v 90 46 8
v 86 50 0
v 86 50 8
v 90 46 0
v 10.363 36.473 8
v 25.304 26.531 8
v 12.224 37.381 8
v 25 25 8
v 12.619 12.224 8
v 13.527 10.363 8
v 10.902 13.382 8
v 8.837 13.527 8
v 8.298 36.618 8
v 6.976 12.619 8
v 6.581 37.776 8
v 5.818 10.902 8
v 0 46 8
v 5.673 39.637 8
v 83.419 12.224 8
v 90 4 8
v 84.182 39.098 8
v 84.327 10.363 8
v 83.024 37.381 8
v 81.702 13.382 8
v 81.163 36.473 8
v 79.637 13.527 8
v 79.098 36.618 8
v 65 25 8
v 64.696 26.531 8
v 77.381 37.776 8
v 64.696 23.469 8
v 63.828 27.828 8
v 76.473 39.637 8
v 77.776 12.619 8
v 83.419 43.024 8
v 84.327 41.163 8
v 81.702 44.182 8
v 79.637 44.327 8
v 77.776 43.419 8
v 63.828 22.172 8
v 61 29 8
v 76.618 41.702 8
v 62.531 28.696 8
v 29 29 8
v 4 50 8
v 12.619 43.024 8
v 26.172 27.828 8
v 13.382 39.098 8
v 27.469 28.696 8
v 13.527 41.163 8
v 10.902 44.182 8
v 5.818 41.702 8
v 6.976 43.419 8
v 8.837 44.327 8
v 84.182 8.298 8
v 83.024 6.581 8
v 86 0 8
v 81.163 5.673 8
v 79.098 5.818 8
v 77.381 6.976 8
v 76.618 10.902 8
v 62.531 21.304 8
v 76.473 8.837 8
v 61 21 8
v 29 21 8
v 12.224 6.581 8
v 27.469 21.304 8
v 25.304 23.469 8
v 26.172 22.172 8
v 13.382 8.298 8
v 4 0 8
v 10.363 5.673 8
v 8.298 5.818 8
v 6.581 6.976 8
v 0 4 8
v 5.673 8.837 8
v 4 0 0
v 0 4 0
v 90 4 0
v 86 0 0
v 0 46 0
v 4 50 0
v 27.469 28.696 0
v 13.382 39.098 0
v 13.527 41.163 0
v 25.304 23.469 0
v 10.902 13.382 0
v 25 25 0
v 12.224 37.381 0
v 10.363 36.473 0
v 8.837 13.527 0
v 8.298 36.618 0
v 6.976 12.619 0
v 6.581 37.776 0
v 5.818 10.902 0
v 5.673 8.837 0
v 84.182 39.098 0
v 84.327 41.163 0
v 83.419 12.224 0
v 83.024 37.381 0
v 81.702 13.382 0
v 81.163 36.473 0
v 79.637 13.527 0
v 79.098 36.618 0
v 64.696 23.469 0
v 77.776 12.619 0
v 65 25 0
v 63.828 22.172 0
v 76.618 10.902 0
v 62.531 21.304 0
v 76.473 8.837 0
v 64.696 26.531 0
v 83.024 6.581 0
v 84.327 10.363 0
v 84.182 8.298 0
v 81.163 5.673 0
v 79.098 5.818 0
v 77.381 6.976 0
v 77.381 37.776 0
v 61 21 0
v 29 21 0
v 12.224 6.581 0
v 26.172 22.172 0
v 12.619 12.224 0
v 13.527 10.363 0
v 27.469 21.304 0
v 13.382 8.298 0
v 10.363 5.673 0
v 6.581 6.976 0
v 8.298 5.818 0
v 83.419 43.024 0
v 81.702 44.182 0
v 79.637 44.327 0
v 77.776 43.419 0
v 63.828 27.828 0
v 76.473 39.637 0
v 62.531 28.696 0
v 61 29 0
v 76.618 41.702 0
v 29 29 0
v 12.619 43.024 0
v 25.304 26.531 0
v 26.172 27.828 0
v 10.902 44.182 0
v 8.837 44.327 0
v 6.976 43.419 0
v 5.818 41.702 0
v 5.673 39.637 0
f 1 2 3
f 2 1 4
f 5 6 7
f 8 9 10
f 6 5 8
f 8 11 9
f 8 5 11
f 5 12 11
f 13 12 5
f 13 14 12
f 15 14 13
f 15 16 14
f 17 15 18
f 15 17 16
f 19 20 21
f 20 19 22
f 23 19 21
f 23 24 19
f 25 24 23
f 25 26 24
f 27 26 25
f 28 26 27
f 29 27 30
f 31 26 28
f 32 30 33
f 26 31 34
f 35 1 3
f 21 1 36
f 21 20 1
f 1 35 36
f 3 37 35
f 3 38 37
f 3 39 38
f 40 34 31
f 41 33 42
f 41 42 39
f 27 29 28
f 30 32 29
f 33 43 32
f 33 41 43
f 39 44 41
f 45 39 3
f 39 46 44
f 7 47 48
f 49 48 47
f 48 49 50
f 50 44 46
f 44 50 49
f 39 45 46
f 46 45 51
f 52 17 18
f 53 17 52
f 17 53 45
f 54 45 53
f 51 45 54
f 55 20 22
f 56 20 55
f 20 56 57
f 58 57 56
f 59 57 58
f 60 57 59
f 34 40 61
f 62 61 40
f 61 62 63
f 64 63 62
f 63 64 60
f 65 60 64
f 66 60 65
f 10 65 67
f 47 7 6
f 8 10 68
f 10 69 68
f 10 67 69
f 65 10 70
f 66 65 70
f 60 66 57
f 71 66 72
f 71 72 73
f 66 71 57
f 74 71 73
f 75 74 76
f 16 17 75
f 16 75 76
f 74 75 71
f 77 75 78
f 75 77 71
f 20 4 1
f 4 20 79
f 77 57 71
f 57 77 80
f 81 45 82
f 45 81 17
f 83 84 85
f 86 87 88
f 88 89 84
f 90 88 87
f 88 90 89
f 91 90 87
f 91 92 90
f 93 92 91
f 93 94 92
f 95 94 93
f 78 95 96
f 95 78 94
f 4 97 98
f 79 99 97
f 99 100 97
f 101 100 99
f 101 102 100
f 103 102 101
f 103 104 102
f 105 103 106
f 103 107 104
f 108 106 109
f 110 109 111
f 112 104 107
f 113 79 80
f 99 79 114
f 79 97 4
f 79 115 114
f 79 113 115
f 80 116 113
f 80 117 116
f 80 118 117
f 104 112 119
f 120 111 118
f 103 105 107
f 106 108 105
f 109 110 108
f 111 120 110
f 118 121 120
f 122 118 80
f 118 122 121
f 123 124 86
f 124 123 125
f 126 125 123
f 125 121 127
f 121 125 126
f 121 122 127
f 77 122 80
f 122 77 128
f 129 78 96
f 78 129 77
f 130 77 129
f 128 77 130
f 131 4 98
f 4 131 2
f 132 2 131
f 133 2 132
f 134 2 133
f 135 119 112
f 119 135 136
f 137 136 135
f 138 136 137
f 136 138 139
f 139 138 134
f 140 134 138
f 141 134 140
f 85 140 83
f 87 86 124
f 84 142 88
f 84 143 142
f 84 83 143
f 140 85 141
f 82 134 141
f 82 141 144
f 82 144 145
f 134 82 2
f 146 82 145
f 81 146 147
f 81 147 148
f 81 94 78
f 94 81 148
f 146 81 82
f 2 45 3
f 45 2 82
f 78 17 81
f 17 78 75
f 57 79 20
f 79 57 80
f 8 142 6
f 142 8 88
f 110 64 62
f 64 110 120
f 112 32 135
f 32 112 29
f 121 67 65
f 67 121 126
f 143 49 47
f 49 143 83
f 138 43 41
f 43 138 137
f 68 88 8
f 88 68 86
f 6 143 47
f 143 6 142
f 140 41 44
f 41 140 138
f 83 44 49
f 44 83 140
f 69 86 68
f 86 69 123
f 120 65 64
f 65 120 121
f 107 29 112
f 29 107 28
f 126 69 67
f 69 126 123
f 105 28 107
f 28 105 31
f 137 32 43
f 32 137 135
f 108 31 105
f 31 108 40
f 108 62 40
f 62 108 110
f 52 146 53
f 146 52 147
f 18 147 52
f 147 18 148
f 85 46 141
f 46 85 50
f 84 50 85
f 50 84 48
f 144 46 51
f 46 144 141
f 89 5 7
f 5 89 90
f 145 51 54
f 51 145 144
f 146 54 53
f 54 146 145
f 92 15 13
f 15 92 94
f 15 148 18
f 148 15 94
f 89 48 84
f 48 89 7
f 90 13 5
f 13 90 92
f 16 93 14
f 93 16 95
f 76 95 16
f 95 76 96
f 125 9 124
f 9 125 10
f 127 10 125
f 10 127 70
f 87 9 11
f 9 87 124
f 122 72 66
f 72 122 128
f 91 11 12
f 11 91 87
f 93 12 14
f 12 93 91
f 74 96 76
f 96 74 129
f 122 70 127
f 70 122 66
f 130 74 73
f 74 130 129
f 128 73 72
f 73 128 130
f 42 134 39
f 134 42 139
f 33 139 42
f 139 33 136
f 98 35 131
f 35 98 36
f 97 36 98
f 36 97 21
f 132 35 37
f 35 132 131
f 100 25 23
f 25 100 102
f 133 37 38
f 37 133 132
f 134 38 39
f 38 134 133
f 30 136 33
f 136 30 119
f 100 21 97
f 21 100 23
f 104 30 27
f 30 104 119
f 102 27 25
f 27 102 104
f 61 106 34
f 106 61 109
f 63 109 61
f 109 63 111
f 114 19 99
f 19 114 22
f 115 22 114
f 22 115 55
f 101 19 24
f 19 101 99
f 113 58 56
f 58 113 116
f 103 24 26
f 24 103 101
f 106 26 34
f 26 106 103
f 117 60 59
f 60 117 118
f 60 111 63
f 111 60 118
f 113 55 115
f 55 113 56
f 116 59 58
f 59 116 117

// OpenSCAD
$fn = 32;

// ----------------------------------------------------------------------
// Bracket plate: slot plate 90 x 50
// ----------------------------------------------------------------------

// --- parameters (mm) ---
hole_r = 4;               // bolt hole radius
plate_t = 8;              // plate thickness, Z (extrusion height)
plate_l = 90;             // plate length
plate_w = 50;             // plate width
slot_l = 32;              // slot straight length
slot_r = 4;               // slot end radius

slot_len = slot_l + 2 * slot_r;
slot_w = 2 * slot_r;
hole_d2 = 2 * hole_r;

profile = [[4, 0], [86, 0], [90, 4], [90, 46], [86, 50], [4, 50], [0, 46], [0, 4]];  // primary outline, 8 points, counter clockwise
void_1 = [[61, 21], [62.531, 21.304], [63.828, 22.172], [64.696, 23.469], [65, 25], [64.696, 26.531], [63.828, 27.828], [62.531, 28.696], [61, 29], [29, 29], [27.469, 28.696], [26.172, 27.828], [25.304, 26.531], [25, 25], [25.304, 23.469], [26.172, 22.172], [27.469, 21.304], [29, 21]];  // grip slot, 18 points
void_2 = [[13.527, 41.163], [12.619, 43.024], [10.902, 44.182], [8.837, 44.327], [6.976, 43.419], [5.818, 41.702], [5.673, 39.637], [6.581, 37.776], [8.298, 36.618], [10.363, 36.473], [12.224, 37.381], [13.382, 39.098]];  // corner hole, 12 points
void_3 = [[13.527, 10.363], [12.619, 12.224], [10.902, 13.382], [8.837, 13.527], [6.976, 12.619], [5.818, 10.902], [5.673, 8.837], [6.581, 6.976], [8.298, 5.818], [10.363, 5.673], [12.224, 6.581], [13.382, 8.298]];  // corner hole, 12 points
void_4 = [[84.327, 41.163], [83.419, 43.024], [81.702, 44.182], [79.637, 44.327], [77.776, 43.419], [76.618, 41.702], [76.473, 39.637], [77.381, 37.776], [79.098, 36.618], [81.163, 36.473], [83.024, 37.381], [84.182, 39.098]];  // corner hole, 12 points
void_5 = [[84.327, 10.363], [83.419, 12.224], [81.702, 13.382], [79.637, 13.527], [77.776, 12.619], [76.618, 10.902], [76.473, 8.837], [77.381, 6.976], [79.098, 5.818], [81.163, 5.673], [83.024, 6.581], [84.182, 8.298]];  // corner hole, 12 points

// --- the one profile operation ---
difference() {
  linear_extrude(height = plate_t) polygon(points = profile);
  translate([0, 0, -1])
    linear_extrude(height = plate_t + 2) polygon(points = void_1);
  translate([0, 0, -1])
    linear_extrude(height = plate_t + 2) polygon(points = void_2);
  translate([0, 0, -1])
    linear_extrude(height = plate_t + 2) polygon(points = void_3);
  translate([0, 0, -1])
    linear_extrude(height = plate_t + 2) polygon(points = void_4);
  translate([0, 0, -1])
    linear_extrude(height = plate_t + 2) polygon(points = void_5);
}
